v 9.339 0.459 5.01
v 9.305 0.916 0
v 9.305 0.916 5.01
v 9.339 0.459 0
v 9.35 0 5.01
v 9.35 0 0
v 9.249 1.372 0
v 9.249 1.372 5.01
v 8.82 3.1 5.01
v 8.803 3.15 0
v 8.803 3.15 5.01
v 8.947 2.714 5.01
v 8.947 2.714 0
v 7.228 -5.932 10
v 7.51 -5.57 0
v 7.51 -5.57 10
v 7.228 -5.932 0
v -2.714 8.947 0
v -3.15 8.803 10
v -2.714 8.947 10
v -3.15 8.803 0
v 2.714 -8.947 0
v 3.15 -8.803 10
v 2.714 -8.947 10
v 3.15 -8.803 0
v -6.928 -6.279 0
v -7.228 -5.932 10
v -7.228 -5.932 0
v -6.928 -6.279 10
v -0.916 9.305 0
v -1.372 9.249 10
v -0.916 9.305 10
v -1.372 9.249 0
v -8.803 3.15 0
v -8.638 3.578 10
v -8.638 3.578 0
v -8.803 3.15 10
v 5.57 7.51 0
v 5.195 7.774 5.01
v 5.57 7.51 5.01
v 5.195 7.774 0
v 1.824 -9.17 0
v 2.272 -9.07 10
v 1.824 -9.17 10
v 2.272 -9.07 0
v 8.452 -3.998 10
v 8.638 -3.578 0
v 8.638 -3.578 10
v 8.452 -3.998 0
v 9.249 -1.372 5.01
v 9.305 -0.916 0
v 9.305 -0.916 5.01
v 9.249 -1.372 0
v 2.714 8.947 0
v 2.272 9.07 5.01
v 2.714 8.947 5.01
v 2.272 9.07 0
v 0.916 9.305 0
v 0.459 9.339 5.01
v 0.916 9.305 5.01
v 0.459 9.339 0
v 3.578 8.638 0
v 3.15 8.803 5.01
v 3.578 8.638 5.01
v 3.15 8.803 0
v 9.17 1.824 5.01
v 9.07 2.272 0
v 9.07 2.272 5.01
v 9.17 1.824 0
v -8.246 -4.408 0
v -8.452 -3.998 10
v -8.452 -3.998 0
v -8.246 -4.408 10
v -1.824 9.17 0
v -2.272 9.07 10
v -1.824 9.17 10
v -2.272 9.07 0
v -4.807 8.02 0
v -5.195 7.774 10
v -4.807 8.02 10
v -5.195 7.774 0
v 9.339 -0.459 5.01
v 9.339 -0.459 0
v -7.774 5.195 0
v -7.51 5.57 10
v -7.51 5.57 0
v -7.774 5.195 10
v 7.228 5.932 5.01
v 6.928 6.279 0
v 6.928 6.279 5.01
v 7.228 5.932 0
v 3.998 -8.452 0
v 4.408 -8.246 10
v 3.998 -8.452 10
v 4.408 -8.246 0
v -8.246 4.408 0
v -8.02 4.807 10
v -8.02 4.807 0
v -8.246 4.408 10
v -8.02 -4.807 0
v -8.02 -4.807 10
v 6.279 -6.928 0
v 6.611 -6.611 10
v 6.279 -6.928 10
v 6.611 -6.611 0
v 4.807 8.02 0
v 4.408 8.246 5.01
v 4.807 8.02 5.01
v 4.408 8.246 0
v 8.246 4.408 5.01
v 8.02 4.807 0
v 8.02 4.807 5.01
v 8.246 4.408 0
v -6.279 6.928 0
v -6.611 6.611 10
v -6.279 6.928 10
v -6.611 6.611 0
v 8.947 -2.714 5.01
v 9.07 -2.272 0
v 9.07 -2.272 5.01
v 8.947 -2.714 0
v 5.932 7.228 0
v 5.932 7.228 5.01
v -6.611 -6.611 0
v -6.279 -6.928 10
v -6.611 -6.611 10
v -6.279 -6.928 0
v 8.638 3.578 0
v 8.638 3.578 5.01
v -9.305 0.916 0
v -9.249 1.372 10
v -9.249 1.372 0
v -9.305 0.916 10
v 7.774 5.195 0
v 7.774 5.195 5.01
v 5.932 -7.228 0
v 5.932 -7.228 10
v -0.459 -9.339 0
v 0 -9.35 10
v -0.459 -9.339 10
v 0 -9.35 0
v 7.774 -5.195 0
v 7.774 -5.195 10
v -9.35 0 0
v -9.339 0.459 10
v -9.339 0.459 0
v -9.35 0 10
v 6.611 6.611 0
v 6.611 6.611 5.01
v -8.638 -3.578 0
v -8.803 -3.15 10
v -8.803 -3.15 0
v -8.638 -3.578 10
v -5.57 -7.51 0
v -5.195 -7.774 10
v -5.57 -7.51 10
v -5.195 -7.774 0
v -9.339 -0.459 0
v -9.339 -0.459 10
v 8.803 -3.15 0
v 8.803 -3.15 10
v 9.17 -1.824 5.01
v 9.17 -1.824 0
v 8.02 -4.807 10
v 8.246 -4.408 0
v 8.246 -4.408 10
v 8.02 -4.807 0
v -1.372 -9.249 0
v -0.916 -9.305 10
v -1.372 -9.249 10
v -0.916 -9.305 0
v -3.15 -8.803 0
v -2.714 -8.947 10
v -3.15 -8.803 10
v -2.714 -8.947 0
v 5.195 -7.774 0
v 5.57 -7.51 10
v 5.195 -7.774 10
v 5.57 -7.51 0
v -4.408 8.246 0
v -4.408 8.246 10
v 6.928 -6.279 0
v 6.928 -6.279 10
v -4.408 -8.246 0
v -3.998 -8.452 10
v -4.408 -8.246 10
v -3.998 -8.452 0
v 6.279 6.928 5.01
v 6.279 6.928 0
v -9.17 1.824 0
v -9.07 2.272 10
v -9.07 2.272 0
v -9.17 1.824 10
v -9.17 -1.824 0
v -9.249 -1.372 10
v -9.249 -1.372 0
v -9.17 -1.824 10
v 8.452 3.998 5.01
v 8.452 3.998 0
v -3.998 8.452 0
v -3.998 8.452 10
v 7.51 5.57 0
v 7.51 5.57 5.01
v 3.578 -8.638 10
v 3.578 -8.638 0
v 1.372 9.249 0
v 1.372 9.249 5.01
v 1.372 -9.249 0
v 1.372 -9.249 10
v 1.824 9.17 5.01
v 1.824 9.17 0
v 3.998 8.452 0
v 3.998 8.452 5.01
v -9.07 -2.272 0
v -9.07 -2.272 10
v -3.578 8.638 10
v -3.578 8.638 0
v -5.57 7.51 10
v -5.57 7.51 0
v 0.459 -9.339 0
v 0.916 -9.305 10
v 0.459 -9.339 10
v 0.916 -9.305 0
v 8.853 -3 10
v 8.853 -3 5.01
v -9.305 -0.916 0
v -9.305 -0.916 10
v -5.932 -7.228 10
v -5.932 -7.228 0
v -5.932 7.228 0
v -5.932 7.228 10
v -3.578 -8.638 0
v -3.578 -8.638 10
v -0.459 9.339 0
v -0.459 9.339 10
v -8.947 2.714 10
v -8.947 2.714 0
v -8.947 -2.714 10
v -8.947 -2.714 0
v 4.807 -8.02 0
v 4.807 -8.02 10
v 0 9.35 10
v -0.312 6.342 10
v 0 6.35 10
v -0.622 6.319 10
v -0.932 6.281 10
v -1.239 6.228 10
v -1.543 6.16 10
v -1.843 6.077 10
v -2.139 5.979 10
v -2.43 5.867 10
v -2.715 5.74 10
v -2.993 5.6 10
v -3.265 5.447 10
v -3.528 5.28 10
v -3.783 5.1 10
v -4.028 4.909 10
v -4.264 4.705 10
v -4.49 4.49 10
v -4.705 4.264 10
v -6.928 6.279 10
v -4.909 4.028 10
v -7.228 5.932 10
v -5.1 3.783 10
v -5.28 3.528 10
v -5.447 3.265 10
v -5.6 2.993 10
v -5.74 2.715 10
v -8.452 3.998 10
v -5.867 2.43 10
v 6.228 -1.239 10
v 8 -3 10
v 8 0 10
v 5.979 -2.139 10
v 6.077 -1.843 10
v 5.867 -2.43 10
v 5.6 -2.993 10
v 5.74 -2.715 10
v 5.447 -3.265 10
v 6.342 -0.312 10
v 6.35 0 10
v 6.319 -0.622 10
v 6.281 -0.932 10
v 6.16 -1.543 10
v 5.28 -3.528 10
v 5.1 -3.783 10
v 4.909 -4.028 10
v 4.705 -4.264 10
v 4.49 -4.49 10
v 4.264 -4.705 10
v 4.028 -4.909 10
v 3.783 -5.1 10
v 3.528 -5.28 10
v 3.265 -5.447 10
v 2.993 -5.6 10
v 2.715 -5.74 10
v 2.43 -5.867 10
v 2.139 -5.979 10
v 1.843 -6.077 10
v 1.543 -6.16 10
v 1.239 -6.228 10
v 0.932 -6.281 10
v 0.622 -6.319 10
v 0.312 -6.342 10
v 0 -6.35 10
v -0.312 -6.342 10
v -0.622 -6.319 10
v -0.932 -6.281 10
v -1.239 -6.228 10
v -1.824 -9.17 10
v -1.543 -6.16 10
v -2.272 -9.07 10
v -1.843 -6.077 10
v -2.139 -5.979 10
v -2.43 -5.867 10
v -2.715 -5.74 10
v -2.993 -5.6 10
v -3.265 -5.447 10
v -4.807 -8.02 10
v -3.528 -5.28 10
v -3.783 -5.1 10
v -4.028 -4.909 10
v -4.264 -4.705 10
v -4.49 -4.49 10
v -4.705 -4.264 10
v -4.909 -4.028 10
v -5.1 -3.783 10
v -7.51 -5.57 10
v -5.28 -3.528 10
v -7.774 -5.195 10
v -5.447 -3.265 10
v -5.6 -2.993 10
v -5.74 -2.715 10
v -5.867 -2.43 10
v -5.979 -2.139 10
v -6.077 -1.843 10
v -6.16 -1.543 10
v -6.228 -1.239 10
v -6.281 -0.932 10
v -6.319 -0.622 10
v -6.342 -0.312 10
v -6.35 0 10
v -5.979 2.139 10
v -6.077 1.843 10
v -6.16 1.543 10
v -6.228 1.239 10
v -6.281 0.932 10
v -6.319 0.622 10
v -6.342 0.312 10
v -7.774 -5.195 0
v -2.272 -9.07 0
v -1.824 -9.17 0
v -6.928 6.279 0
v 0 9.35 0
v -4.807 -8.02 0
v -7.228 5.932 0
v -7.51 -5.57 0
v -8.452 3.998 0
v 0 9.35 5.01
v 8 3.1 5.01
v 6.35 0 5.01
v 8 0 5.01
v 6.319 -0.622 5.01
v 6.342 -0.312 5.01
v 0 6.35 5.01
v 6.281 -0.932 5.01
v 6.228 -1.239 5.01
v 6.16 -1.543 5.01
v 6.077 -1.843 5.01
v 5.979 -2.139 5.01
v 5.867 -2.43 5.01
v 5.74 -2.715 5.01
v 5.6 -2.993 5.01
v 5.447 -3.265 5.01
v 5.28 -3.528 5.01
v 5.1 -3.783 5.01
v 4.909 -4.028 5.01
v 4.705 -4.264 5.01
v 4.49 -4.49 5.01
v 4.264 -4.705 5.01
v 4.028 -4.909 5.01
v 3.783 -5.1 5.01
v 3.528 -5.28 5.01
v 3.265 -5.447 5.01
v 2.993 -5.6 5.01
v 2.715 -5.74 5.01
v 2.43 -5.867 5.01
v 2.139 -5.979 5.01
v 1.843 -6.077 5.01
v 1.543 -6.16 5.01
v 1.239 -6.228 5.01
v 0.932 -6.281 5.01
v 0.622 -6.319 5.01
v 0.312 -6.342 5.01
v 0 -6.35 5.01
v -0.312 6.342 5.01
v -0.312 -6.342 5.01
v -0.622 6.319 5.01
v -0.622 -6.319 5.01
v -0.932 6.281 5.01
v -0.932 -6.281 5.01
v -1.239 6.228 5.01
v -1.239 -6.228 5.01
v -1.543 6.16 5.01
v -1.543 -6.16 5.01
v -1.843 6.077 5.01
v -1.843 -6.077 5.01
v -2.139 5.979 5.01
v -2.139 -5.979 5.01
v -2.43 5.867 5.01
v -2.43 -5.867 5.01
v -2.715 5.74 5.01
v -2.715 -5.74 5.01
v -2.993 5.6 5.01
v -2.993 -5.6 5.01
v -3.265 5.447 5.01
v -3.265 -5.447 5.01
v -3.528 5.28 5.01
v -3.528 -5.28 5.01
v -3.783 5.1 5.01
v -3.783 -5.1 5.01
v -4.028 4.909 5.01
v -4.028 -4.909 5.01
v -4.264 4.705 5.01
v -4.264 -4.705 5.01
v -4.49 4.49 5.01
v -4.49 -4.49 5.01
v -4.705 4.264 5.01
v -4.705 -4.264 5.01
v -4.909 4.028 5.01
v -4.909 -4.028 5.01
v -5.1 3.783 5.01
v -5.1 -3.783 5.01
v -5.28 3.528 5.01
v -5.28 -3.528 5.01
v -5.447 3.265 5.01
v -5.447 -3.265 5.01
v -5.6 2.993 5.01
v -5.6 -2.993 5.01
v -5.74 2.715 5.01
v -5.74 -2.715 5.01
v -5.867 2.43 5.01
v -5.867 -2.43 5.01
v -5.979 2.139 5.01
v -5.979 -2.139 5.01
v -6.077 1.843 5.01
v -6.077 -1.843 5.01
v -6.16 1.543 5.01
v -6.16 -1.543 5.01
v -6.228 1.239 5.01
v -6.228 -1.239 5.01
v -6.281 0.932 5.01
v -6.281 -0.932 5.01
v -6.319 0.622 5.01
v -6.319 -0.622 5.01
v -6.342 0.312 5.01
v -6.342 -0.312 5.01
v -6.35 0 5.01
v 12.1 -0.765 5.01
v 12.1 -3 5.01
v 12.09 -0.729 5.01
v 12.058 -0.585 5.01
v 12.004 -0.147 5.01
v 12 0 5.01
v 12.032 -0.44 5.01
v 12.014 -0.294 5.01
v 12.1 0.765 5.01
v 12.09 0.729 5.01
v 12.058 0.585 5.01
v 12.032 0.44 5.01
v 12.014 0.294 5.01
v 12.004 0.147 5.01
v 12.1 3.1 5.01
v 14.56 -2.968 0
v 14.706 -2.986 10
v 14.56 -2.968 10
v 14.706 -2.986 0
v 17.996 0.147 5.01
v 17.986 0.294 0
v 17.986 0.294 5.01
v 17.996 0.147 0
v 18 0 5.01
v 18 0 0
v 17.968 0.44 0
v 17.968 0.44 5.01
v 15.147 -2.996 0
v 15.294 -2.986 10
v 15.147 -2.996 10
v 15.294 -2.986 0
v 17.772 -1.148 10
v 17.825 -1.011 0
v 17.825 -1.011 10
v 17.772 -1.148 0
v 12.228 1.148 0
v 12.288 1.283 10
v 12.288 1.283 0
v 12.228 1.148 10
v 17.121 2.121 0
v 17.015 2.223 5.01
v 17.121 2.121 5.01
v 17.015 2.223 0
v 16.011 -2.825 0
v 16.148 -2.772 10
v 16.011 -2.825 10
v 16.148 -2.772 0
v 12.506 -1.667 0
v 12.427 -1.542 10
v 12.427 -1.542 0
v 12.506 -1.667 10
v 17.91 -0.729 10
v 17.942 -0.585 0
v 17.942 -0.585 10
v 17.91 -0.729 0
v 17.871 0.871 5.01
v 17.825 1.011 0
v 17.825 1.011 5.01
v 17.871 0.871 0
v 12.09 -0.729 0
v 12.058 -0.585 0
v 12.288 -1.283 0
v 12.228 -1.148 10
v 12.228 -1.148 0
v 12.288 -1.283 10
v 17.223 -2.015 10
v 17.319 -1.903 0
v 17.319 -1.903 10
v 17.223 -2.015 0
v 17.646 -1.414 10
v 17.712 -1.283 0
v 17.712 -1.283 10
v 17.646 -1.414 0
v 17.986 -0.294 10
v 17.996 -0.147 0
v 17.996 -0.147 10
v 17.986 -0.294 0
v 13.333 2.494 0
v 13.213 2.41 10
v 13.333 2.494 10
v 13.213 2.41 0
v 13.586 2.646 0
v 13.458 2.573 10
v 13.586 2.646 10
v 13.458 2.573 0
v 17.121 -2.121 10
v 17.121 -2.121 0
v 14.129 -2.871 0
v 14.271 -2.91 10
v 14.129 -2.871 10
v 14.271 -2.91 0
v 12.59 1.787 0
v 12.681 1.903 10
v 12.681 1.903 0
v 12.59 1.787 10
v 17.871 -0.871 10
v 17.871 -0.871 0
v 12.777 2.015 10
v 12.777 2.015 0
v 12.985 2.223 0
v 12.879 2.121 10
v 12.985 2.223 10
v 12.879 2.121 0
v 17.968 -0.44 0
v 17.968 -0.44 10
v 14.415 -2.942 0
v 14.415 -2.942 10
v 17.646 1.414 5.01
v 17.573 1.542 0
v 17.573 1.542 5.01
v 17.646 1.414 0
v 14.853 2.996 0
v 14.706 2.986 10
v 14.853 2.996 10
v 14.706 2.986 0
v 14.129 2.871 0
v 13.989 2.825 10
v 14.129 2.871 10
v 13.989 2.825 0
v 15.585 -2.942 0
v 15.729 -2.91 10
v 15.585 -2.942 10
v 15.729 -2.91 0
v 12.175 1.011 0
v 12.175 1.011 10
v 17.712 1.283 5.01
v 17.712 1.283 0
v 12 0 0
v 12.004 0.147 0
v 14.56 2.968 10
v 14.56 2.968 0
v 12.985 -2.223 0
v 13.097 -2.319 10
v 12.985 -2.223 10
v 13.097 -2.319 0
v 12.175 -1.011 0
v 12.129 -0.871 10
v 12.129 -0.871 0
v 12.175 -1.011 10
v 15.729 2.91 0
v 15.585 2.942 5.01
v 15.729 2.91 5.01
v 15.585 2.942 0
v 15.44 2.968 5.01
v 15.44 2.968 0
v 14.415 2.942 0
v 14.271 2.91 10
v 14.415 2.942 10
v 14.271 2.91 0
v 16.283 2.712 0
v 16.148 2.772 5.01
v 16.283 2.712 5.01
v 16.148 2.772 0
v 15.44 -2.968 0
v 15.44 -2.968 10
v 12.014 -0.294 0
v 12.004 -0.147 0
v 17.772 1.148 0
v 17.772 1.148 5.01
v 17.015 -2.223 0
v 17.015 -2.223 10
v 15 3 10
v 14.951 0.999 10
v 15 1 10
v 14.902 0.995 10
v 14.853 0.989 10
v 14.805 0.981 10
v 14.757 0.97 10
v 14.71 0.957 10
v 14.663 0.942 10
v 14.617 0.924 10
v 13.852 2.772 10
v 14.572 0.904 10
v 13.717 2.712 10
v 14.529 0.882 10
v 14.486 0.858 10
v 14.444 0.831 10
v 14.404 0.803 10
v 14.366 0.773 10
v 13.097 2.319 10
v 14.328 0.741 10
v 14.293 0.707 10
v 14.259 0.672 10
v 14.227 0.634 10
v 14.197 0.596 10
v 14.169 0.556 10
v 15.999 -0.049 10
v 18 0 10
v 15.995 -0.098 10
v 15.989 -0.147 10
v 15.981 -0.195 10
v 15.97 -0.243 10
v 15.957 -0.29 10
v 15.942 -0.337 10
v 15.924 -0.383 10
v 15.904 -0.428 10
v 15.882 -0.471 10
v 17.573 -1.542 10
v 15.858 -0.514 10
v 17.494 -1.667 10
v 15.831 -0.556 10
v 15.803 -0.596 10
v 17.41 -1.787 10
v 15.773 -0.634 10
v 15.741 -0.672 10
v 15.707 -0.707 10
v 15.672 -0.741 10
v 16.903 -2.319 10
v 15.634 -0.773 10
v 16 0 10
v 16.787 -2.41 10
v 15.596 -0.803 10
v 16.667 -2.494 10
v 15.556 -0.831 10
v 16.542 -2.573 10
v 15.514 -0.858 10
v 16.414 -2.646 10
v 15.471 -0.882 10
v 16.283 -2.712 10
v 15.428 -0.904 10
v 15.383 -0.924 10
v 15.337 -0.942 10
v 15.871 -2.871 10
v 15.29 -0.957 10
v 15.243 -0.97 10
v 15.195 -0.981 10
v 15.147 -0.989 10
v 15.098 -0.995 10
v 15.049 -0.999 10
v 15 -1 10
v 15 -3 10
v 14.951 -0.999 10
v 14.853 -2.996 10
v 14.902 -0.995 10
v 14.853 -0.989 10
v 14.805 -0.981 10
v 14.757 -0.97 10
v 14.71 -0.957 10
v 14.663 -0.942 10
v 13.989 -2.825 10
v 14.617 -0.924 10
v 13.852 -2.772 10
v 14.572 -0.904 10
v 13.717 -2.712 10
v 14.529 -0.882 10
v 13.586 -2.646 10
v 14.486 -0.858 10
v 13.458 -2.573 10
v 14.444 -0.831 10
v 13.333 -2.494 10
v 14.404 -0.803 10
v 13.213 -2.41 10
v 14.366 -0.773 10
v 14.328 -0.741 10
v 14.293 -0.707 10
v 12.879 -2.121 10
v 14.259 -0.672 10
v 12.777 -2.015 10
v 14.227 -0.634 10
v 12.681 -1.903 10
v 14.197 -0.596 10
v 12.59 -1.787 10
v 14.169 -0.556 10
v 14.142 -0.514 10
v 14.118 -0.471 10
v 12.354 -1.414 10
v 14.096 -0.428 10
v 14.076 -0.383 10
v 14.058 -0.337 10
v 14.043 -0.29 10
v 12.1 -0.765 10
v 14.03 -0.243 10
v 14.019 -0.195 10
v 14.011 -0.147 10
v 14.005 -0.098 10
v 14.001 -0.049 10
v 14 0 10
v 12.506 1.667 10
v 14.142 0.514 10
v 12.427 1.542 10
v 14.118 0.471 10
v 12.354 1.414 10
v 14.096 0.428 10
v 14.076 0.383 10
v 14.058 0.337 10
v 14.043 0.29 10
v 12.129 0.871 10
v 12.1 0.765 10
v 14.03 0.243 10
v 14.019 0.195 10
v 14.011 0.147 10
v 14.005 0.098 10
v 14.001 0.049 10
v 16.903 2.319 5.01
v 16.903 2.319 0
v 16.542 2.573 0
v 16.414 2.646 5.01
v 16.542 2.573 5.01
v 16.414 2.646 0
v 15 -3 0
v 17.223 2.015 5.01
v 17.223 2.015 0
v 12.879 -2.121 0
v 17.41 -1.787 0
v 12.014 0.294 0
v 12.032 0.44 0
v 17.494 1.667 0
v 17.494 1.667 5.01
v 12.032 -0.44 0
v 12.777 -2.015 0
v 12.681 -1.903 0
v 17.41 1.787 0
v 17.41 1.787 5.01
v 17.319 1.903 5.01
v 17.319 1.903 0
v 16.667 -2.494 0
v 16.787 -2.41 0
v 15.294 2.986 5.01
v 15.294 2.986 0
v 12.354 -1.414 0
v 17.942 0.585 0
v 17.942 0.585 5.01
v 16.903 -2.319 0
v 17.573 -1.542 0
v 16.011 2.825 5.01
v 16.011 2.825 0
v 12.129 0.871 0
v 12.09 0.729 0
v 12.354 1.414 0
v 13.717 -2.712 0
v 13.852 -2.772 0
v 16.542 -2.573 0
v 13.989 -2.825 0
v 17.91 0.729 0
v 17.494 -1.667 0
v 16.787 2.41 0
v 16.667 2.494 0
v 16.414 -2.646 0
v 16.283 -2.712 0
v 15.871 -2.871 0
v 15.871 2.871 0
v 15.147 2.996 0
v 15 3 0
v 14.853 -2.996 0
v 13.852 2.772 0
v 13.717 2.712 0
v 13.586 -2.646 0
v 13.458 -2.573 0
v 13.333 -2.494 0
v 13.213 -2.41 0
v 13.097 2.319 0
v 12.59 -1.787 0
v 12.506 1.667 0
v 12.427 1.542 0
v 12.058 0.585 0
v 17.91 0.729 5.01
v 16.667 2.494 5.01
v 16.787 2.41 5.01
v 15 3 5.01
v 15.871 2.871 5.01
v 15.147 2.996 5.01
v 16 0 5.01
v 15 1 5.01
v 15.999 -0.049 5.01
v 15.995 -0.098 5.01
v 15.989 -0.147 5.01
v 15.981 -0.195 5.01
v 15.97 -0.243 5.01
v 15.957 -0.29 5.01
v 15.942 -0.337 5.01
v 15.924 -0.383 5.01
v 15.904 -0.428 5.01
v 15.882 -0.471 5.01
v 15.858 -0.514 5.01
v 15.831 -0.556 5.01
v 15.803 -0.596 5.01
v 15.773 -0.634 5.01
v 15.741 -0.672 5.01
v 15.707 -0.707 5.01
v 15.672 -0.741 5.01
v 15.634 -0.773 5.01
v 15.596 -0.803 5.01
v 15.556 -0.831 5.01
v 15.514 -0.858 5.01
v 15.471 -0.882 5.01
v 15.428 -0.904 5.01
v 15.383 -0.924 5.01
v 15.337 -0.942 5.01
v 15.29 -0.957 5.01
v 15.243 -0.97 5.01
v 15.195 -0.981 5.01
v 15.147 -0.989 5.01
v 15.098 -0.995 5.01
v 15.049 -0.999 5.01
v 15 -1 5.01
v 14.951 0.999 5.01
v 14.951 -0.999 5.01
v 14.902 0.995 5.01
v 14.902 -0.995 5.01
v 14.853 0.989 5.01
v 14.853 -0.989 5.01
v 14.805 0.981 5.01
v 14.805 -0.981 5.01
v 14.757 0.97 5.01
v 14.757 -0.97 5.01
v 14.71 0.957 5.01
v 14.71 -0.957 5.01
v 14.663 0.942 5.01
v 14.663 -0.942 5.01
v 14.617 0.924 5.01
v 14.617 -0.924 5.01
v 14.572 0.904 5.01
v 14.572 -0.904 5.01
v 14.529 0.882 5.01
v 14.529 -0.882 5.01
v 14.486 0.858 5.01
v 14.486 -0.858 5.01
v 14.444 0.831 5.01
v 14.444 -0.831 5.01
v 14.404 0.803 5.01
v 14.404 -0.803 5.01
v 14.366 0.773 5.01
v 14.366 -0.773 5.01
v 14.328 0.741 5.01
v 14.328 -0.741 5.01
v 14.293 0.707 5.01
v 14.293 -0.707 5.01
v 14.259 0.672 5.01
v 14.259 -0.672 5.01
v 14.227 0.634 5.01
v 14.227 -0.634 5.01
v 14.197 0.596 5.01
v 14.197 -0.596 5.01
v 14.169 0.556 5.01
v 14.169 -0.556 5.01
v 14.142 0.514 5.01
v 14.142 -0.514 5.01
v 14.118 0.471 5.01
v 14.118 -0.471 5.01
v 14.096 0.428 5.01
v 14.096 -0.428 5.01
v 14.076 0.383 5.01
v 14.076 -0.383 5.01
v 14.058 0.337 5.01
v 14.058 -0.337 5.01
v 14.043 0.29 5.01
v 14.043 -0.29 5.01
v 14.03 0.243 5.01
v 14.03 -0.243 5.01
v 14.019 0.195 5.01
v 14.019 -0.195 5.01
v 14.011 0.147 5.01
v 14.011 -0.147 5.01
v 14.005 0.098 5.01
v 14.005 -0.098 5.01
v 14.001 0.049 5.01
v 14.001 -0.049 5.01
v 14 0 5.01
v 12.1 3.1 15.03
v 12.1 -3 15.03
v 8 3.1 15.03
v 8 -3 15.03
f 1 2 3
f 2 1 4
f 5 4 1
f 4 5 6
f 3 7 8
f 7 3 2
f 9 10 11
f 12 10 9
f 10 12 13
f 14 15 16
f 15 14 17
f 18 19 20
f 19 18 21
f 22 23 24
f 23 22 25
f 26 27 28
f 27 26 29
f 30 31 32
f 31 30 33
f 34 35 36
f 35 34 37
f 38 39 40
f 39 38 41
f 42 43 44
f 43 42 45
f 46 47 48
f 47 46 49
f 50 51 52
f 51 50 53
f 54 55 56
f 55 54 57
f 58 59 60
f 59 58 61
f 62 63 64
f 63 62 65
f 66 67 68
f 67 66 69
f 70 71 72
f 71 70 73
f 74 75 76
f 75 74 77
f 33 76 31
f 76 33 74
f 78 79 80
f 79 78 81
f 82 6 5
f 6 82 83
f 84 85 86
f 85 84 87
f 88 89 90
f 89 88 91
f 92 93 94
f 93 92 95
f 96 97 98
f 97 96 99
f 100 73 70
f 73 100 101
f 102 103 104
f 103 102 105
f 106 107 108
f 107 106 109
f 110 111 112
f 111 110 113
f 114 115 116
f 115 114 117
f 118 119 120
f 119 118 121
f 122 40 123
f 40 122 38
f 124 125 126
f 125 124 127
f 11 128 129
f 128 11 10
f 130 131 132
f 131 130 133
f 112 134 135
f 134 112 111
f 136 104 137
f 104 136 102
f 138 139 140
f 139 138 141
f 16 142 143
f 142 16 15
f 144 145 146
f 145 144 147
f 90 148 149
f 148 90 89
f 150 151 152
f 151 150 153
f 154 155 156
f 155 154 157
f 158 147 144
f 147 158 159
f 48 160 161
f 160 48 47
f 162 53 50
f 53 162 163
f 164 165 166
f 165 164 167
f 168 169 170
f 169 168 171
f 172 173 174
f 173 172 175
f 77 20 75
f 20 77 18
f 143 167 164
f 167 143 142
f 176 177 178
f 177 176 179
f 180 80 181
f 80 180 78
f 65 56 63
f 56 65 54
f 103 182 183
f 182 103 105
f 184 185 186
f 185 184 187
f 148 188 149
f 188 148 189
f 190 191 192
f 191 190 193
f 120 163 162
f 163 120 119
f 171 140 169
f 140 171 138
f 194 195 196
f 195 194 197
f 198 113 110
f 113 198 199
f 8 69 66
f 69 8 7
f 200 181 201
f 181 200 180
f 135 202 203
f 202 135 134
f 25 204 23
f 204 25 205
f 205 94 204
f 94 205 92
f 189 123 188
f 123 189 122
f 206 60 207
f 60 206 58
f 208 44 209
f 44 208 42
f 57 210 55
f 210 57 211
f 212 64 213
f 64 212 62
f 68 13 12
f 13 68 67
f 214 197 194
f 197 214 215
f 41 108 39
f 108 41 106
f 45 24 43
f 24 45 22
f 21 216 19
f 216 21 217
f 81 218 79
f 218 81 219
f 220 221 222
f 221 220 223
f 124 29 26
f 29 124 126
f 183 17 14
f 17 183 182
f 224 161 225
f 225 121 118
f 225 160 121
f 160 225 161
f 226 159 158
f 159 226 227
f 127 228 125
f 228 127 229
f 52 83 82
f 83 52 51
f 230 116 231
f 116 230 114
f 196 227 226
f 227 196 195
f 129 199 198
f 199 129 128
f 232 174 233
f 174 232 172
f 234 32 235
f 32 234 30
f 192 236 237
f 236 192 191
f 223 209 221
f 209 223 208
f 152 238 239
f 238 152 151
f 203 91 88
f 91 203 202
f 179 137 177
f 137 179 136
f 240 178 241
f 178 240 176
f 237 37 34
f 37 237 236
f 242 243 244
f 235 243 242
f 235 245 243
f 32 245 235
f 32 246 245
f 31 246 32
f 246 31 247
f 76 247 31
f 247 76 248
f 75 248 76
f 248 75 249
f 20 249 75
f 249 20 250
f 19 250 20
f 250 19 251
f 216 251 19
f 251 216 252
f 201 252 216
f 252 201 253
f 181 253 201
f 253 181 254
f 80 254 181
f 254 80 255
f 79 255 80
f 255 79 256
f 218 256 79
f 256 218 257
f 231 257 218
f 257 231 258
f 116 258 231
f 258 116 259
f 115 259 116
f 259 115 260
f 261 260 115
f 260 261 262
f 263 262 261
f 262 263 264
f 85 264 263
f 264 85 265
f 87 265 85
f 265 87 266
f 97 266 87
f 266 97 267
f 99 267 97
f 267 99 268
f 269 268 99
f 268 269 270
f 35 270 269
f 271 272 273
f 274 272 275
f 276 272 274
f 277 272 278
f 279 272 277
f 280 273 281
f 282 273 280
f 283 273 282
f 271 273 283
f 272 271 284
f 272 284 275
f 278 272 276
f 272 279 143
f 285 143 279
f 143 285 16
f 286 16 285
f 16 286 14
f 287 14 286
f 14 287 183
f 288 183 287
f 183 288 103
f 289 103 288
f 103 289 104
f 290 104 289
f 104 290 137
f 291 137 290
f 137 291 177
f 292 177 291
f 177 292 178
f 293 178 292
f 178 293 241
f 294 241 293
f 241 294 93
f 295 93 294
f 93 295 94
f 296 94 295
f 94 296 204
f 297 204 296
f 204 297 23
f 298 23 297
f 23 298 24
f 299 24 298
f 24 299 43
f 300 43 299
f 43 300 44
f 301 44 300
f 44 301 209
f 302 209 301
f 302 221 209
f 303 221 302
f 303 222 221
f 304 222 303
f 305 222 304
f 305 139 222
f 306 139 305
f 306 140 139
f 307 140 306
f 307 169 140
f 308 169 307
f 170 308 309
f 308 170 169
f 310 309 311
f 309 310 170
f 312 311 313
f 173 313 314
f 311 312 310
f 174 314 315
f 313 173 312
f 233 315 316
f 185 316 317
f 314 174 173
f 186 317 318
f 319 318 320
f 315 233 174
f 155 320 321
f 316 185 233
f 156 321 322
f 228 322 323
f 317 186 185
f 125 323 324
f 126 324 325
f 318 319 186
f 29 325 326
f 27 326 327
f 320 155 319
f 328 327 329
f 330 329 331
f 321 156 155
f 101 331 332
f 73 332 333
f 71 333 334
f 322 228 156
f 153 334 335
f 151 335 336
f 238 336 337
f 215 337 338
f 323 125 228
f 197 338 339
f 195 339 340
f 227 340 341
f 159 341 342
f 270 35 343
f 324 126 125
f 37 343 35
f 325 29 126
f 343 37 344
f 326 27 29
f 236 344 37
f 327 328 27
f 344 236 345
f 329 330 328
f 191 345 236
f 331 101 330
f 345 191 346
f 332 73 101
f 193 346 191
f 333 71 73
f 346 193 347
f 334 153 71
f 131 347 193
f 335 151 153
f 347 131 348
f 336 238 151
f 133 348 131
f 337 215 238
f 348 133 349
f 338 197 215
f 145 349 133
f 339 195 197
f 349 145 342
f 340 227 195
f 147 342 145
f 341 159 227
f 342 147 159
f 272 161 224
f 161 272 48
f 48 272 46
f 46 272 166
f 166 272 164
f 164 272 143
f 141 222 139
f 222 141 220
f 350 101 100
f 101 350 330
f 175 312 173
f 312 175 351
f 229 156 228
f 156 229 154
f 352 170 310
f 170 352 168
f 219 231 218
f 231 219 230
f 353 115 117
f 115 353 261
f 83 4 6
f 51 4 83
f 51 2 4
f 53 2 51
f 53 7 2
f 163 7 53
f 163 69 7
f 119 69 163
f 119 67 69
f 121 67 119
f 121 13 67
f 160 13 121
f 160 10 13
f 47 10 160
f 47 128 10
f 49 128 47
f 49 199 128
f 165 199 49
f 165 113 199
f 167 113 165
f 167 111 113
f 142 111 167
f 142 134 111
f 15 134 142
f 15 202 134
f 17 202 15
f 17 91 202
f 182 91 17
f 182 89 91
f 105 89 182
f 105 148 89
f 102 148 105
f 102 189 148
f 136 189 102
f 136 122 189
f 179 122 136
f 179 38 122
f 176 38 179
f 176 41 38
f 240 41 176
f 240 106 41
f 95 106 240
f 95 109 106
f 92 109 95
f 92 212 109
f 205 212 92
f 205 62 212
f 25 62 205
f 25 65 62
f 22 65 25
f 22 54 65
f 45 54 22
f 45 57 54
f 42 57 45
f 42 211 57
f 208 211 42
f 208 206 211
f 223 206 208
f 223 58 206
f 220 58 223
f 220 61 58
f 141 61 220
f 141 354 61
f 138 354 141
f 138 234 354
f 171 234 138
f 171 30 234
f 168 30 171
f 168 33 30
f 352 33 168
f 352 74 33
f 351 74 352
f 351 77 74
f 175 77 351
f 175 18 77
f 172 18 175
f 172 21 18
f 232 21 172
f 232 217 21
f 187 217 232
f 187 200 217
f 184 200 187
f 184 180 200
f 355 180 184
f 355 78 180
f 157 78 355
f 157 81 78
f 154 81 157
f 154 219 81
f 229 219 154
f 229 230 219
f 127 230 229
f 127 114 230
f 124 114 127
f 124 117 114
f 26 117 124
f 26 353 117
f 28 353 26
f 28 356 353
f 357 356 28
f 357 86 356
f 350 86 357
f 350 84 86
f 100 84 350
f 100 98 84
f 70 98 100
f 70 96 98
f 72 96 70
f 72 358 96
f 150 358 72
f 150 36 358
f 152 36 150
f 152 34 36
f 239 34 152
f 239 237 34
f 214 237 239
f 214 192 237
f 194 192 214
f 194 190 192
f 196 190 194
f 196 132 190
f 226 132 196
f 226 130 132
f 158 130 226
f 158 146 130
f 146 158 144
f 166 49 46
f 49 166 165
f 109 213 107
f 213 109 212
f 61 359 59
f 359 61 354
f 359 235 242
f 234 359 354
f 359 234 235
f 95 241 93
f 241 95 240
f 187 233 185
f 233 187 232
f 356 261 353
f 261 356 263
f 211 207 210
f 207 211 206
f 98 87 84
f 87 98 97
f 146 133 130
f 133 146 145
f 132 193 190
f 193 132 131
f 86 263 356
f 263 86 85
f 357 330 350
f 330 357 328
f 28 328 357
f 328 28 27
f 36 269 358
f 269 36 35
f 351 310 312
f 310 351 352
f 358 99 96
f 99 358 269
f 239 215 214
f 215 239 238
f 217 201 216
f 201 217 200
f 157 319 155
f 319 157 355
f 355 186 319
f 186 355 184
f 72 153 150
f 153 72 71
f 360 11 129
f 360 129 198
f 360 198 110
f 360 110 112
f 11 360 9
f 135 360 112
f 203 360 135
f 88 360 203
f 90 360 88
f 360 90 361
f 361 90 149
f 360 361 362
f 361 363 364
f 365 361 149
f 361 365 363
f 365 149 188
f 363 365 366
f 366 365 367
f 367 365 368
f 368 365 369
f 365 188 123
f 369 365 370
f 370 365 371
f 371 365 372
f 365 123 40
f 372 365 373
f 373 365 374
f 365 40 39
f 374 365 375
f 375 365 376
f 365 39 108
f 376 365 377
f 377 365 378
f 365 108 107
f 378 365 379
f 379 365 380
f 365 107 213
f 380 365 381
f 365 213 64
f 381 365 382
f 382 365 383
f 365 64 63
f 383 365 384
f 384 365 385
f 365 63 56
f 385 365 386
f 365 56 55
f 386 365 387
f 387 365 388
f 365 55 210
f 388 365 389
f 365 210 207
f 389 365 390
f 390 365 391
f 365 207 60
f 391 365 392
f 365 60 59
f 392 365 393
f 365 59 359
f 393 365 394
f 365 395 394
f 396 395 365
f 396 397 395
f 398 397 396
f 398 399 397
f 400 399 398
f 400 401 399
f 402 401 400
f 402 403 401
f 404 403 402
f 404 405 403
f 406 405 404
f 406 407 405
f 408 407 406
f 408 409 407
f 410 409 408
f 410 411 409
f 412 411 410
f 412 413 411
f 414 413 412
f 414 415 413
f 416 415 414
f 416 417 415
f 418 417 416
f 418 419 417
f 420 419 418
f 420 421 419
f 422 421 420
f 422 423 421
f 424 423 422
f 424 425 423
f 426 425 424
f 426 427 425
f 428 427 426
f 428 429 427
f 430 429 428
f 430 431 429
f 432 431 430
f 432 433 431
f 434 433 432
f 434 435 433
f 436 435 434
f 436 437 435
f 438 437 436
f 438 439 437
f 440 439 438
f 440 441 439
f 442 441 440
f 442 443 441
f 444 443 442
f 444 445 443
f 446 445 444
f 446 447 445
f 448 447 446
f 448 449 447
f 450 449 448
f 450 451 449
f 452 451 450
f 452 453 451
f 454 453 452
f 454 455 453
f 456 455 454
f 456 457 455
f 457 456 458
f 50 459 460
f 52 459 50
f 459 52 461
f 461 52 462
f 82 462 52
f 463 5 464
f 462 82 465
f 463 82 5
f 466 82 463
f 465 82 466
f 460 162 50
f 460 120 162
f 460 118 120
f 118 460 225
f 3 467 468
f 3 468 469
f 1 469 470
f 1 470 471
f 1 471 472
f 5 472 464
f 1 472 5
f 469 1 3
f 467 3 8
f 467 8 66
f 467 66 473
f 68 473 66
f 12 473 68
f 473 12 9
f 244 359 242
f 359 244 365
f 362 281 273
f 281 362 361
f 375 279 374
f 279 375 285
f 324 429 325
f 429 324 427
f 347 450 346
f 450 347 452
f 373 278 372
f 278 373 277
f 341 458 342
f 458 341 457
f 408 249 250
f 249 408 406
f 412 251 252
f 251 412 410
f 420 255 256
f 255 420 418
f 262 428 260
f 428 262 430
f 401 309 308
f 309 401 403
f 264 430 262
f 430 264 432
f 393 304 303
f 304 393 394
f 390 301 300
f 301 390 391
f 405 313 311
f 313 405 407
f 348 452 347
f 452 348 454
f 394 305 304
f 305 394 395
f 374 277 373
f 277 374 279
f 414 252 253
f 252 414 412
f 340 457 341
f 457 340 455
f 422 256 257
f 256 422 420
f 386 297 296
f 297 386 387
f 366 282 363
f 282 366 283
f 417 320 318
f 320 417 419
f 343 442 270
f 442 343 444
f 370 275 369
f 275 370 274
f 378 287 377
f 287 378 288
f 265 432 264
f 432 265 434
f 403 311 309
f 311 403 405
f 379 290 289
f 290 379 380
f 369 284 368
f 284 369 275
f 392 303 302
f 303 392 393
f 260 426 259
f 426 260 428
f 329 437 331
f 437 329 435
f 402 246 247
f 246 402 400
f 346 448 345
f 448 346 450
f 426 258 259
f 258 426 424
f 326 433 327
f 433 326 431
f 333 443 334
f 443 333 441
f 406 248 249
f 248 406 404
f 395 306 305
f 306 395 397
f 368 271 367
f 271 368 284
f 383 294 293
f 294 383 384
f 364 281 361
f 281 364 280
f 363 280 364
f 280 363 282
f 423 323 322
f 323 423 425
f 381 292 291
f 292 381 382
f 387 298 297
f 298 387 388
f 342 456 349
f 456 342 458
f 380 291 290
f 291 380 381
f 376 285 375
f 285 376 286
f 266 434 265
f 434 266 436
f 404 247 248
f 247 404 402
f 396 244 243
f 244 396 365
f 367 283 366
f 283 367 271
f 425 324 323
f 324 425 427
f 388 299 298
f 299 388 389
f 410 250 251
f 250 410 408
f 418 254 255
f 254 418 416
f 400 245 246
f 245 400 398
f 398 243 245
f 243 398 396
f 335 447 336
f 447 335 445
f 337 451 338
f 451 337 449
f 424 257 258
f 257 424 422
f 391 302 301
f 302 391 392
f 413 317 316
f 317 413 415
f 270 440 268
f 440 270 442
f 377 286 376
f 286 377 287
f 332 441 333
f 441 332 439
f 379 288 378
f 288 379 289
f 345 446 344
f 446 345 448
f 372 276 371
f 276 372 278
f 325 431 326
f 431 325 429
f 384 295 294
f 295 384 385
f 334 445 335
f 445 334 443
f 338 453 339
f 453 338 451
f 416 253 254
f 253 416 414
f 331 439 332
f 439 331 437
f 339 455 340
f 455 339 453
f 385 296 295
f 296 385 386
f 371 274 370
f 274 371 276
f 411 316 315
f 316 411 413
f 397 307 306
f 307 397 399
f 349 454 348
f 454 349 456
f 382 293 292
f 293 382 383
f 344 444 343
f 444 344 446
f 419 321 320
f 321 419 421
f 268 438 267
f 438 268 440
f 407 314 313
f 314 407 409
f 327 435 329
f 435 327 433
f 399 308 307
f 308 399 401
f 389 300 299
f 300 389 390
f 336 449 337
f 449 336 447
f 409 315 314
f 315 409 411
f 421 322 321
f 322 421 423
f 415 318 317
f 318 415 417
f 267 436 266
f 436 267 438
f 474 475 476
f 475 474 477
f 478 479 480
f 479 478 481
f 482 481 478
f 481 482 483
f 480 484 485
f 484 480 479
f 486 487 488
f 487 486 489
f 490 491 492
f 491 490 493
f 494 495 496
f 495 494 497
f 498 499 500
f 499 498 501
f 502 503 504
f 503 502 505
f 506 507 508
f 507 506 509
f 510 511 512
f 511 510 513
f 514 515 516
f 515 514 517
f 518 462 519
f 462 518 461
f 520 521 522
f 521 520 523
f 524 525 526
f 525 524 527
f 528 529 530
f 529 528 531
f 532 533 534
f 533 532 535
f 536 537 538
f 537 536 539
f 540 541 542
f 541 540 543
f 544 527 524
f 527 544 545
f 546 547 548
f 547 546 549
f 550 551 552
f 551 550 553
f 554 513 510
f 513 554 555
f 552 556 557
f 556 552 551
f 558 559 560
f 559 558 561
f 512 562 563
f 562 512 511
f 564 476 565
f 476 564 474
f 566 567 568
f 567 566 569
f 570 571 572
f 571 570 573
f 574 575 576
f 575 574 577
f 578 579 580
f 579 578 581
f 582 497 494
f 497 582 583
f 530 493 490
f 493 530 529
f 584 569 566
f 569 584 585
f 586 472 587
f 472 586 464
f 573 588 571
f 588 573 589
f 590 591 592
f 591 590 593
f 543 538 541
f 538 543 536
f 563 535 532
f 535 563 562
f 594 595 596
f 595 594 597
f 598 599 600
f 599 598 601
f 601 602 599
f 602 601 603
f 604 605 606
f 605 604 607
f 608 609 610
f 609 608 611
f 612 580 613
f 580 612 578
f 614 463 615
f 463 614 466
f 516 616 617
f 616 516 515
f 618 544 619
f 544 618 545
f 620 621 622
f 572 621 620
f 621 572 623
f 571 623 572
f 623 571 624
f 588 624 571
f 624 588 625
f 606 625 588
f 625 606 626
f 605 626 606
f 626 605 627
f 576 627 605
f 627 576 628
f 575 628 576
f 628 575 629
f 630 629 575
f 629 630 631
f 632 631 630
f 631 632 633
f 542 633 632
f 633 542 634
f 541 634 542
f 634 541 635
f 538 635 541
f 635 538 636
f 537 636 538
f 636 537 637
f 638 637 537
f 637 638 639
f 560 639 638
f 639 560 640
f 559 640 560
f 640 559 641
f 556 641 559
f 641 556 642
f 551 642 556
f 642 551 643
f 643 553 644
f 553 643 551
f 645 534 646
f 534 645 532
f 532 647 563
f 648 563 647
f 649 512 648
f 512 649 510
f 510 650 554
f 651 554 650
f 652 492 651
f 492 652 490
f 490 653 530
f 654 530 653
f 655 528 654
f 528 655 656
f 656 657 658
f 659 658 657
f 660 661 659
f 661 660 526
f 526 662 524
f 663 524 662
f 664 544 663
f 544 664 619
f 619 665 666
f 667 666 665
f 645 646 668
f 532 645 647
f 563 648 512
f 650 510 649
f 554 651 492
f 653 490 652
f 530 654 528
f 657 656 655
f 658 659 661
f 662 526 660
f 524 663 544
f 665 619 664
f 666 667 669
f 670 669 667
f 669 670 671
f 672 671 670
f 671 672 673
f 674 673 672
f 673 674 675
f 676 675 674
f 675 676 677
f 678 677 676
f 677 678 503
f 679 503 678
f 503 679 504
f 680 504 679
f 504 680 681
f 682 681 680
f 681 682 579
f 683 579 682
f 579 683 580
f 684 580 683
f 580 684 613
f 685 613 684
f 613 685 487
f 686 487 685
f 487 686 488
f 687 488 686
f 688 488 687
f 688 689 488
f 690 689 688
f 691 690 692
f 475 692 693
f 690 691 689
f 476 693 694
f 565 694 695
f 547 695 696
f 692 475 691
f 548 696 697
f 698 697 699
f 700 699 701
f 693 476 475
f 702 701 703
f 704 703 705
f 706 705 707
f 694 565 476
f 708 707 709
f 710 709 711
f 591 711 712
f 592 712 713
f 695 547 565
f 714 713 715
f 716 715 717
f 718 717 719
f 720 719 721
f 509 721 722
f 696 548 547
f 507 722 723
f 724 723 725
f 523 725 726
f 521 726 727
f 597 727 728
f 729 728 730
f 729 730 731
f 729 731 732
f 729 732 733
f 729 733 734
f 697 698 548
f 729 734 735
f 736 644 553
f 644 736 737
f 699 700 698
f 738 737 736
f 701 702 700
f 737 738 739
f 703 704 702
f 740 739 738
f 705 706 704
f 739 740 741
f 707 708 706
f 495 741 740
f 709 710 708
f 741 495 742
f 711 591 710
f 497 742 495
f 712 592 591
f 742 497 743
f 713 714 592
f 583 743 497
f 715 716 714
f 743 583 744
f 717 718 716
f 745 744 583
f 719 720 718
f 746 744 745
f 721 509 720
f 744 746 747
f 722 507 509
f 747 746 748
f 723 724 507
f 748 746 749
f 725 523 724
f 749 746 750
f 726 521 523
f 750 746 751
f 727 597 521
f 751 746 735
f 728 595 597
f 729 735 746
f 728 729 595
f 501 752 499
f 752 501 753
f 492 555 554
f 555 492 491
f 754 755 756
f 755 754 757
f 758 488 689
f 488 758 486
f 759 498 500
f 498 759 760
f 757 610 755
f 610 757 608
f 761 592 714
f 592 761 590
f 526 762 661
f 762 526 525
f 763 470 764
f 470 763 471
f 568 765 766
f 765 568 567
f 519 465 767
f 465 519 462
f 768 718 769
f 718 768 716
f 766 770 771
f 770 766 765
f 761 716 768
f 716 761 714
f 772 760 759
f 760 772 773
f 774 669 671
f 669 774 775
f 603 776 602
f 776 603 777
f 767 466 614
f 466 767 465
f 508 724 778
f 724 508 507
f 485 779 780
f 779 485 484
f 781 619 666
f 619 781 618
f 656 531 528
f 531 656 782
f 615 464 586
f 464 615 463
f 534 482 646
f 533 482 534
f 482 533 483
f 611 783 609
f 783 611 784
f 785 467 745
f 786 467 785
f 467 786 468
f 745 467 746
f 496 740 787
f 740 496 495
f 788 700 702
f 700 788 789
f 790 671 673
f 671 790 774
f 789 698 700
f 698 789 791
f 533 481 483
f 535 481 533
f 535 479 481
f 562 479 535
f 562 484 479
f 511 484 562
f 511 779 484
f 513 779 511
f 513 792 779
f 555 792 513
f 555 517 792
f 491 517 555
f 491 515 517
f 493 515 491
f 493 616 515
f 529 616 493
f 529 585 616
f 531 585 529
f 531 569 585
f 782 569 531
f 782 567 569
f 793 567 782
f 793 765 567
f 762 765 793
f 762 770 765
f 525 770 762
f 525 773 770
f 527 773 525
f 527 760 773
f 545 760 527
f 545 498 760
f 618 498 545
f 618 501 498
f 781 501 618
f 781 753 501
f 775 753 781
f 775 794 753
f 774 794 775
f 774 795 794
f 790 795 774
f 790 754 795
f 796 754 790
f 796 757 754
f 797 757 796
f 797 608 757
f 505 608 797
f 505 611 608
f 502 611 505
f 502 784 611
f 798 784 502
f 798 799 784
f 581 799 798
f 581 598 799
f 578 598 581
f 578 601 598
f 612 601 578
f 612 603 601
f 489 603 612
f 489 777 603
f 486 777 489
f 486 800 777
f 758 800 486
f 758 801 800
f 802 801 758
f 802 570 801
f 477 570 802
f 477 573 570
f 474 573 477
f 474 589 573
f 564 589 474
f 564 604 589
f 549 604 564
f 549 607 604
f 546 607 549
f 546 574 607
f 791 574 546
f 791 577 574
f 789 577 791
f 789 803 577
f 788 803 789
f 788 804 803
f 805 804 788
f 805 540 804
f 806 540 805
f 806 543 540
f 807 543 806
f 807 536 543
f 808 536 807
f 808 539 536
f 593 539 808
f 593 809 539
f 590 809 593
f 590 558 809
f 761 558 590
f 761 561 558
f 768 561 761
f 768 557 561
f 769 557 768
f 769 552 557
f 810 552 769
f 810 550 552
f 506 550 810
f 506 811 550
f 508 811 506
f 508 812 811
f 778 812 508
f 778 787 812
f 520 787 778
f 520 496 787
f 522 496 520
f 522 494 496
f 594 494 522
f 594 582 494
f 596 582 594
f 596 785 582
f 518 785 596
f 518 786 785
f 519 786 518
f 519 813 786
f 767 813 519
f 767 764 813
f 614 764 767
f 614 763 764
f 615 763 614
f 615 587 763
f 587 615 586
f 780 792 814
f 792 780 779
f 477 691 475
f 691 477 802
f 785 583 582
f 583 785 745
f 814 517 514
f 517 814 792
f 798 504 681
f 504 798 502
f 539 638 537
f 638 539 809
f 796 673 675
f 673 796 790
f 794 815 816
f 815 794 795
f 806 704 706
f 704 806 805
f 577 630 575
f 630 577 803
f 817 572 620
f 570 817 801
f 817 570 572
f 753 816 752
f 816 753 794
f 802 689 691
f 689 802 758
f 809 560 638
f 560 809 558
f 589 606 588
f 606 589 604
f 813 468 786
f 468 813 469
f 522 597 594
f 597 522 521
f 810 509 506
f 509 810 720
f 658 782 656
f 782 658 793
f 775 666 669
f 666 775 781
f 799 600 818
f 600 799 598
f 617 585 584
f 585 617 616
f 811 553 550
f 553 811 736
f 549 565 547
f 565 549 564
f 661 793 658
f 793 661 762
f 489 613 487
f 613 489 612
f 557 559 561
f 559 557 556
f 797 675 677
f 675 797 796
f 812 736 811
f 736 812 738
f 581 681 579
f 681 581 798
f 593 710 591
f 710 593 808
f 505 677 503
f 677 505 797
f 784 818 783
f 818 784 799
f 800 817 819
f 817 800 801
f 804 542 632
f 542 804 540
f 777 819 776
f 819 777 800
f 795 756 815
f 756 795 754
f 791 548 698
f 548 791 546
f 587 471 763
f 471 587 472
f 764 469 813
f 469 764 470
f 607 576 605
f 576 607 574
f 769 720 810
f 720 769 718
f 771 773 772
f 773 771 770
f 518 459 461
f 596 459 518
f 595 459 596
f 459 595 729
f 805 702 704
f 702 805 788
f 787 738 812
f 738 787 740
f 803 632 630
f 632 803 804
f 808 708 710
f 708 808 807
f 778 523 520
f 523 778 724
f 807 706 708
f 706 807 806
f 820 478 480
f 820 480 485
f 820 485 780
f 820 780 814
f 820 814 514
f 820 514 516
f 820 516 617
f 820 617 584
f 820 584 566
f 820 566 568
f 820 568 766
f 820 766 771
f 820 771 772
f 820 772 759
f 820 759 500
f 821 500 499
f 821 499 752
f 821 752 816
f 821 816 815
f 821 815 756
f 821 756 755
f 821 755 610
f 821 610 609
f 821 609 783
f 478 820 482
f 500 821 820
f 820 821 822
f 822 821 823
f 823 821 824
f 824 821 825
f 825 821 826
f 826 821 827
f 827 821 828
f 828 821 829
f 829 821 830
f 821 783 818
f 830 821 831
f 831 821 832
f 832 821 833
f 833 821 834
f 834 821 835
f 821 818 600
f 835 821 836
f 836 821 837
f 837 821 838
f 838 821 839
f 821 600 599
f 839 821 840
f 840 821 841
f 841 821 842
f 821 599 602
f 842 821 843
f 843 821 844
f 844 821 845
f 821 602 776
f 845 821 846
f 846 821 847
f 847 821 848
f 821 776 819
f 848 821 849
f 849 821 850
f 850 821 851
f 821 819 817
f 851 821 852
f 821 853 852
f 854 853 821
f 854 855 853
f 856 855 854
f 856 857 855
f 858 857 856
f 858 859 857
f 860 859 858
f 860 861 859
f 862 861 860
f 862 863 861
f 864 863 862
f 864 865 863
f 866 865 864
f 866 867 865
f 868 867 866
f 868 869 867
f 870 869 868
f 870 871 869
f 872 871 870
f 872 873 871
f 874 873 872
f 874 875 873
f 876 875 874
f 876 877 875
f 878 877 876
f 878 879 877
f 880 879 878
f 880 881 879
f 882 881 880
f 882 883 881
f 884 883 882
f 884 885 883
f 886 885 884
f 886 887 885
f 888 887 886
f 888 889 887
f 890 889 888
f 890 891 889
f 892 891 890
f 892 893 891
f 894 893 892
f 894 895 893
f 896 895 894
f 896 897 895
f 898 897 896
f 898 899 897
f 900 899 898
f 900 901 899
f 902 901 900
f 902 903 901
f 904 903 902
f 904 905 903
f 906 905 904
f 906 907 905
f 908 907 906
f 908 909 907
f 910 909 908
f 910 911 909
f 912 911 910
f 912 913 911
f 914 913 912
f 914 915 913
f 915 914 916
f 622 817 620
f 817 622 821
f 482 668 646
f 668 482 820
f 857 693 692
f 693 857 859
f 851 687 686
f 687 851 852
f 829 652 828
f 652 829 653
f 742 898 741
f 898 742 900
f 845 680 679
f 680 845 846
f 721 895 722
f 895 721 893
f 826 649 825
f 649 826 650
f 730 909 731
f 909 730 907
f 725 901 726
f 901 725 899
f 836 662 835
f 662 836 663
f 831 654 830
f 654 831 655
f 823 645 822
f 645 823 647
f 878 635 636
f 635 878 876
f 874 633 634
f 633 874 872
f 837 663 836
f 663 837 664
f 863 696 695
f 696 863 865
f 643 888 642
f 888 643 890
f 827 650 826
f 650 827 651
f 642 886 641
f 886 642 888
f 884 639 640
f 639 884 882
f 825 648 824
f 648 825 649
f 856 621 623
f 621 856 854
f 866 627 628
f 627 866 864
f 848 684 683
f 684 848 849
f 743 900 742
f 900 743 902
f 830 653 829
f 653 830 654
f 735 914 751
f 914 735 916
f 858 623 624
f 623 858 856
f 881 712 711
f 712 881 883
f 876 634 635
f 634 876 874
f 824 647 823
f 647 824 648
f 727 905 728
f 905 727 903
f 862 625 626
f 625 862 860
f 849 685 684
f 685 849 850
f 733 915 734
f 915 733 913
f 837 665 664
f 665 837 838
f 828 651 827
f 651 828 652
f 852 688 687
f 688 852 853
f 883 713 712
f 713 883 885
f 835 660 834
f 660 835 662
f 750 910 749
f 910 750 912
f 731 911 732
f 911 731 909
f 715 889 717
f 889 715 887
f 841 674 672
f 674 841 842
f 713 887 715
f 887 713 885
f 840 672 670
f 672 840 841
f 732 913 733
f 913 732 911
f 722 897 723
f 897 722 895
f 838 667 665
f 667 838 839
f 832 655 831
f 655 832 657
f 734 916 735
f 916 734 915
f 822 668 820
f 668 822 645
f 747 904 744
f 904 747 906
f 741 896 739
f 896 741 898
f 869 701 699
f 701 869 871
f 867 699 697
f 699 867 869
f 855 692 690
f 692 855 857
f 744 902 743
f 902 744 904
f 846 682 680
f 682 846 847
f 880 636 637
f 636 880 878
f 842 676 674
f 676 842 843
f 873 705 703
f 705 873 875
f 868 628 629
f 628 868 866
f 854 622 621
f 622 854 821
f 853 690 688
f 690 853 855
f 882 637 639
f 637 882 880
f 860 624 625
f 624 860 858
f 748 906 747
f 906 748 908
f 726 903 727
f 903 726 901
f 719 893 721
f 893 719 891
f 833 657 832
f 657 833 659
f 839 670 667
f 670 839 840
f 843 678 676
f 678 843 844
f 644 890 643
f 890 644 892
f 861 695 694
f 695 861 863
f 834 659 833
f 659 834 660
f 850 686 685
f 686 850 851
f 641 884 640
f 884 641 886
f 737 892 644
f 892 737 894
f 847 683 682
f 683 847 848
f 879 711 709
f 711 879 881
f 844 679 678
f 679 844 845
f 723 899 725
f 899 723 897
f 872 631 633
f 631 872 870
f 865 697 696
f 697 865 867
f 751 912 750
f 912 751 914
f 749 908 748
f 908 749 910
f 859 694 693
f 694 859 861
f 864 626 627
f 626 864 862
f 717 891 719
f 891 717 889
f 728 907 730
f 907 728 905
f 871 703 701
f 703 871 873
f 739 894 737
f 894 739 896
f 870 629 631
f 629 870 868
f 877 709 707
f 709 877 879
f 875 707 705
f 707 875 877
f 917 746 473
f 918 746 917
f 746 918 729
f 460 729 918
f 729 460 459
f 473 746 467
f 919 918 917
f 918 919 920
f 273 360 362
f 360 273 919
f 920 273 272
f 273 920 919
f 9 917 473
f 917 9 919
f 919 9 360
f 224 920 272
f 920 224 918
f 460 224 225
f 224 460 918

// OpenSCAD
$fn = 128; // High resolution for smooth curves and accurate hole sizes

// --- Dimensions ---
// Rod Stand Dimensions (1/2 inch)
$rod_diameter = 12.7;
$rod_wall_thickness = 3;
$rod_outer_diameter = $rod_diameter + (2 * $rod_wall_thickness); // 18.7 mm
$rod_outer_radius = $rod_outer_diameter / 2;

// Tubing Dimensions
$tubing_outer_diameter = 6;
$tubing_wall_thickness = 2;
$tubing_inner_diameter = $tubing_outer_diameter - (2 * $tubing_wall_thickness); // 4 mm
$tubing_inner_radius = $tubing_inner_diameter / 2;

// Positioning
$rod_center = [0, 0];
$tubing_center = [15, 0];

// Bridge Dimensions
// Solid bridge 6 mm wide (Y) between x = 8 and x = 12
$bridge_start_x = 8;
$bridge_end_x = 12;
$bridge_width_x = $bridge_end_x - $bridge_start_x; // 4 mm
$bridge_width_y = 6;

// Cutout Dimensions
// Rod Cutout: 10mm wide (-5 to +5), centered at y=0
$rod_cutout_width = 10;
$rod_cutout_half_y = $rod_cutout_width / 2;

// Tubing Cutout: 4.5mm wide (-2.25 to +2.25), centered at y=0
$tubing_cutout_width = 4.5;
$tubing_cutout_half_y = $tubing_cutout_width / 2;

// Extrusion Height
$height = 10;

// --- Main Module ---
module lab_clip() {
    difference() {
        // 1. Create the solid base profile (Union of all parts)
        // We use Union to combine the rings and the bridge into one solid mass first.
        union() {
            // --- Rod Ring Construction ---
            // Strategy: Union Outer Cylinder + Cutout Block, then subtract Inner Cylinder
            difference() {
                // Outer Cylinder
                cylinder(
                    h = $height,
                    r = $rod_outer_radius,
                    center = $rod_center
                );
                
                // Cutout Block (Unioned to the outer cylinder)
                // Extends slightly past the face to ensure clean cut
                translate([0, 0, $height/2 + 0.01]) 
                    cube([
                        $rod_cutout_width + 0.1, 
                        $rod_cutout_half_y * 2 + 0.1, 
                        $height + 0.02
                    ]);
                
                // Inner Cylinder (Hole)
                // Extends slightly past the face to ensure clean cut
                translate([0, 0, $height/2 + 0.01])
                    cylinder(
                        h = $height + 0.02,
                        r = $rod_diameter / 2,
                        center = $rod_center
                    );
            }
            
            // --- Tubing Ring Construction ---
            // Same strategy: Union Outer + Cutout, then subtract Inner
            translate($tubing_center)
            difference() {
                // Outer Cylinder
                cylinder(
                    h = $height,
                    r = $tubing_outer_diameter / 2,
                    center = [0, 0]
                );
                
                // Cutout Block
                translate([0, 0, $height/2 + 0.01]) 
                    cube([
                        $tubing_cutout_width + 0.1, 
                        $tubing_cutout_half_y * 2 + 0.1, 
                        $height + 0.02
                    ]);
                
                // Inner Cylinder (Hole)
                translate([0, 0, $height/2 + 0.01])
                    cylinder(
                        h = $height + 0.02,
                        r = $tubing_inner_radius,
                        center = [0, 0]
                    );
            }
            
            // --- Solid Bridge ---
            // Simple cube connecting the two rings
            translate([$bridge_start_x, -($bridge_width_y/2), $height/2 + 0.01])
                cube([
                    $bridge_width_x + 0.1, 
                    $bridge_width_y + 0.1, 
                    $height + 0.02
                ]);
        }
    }
}

// Render the part
lab_clip();
